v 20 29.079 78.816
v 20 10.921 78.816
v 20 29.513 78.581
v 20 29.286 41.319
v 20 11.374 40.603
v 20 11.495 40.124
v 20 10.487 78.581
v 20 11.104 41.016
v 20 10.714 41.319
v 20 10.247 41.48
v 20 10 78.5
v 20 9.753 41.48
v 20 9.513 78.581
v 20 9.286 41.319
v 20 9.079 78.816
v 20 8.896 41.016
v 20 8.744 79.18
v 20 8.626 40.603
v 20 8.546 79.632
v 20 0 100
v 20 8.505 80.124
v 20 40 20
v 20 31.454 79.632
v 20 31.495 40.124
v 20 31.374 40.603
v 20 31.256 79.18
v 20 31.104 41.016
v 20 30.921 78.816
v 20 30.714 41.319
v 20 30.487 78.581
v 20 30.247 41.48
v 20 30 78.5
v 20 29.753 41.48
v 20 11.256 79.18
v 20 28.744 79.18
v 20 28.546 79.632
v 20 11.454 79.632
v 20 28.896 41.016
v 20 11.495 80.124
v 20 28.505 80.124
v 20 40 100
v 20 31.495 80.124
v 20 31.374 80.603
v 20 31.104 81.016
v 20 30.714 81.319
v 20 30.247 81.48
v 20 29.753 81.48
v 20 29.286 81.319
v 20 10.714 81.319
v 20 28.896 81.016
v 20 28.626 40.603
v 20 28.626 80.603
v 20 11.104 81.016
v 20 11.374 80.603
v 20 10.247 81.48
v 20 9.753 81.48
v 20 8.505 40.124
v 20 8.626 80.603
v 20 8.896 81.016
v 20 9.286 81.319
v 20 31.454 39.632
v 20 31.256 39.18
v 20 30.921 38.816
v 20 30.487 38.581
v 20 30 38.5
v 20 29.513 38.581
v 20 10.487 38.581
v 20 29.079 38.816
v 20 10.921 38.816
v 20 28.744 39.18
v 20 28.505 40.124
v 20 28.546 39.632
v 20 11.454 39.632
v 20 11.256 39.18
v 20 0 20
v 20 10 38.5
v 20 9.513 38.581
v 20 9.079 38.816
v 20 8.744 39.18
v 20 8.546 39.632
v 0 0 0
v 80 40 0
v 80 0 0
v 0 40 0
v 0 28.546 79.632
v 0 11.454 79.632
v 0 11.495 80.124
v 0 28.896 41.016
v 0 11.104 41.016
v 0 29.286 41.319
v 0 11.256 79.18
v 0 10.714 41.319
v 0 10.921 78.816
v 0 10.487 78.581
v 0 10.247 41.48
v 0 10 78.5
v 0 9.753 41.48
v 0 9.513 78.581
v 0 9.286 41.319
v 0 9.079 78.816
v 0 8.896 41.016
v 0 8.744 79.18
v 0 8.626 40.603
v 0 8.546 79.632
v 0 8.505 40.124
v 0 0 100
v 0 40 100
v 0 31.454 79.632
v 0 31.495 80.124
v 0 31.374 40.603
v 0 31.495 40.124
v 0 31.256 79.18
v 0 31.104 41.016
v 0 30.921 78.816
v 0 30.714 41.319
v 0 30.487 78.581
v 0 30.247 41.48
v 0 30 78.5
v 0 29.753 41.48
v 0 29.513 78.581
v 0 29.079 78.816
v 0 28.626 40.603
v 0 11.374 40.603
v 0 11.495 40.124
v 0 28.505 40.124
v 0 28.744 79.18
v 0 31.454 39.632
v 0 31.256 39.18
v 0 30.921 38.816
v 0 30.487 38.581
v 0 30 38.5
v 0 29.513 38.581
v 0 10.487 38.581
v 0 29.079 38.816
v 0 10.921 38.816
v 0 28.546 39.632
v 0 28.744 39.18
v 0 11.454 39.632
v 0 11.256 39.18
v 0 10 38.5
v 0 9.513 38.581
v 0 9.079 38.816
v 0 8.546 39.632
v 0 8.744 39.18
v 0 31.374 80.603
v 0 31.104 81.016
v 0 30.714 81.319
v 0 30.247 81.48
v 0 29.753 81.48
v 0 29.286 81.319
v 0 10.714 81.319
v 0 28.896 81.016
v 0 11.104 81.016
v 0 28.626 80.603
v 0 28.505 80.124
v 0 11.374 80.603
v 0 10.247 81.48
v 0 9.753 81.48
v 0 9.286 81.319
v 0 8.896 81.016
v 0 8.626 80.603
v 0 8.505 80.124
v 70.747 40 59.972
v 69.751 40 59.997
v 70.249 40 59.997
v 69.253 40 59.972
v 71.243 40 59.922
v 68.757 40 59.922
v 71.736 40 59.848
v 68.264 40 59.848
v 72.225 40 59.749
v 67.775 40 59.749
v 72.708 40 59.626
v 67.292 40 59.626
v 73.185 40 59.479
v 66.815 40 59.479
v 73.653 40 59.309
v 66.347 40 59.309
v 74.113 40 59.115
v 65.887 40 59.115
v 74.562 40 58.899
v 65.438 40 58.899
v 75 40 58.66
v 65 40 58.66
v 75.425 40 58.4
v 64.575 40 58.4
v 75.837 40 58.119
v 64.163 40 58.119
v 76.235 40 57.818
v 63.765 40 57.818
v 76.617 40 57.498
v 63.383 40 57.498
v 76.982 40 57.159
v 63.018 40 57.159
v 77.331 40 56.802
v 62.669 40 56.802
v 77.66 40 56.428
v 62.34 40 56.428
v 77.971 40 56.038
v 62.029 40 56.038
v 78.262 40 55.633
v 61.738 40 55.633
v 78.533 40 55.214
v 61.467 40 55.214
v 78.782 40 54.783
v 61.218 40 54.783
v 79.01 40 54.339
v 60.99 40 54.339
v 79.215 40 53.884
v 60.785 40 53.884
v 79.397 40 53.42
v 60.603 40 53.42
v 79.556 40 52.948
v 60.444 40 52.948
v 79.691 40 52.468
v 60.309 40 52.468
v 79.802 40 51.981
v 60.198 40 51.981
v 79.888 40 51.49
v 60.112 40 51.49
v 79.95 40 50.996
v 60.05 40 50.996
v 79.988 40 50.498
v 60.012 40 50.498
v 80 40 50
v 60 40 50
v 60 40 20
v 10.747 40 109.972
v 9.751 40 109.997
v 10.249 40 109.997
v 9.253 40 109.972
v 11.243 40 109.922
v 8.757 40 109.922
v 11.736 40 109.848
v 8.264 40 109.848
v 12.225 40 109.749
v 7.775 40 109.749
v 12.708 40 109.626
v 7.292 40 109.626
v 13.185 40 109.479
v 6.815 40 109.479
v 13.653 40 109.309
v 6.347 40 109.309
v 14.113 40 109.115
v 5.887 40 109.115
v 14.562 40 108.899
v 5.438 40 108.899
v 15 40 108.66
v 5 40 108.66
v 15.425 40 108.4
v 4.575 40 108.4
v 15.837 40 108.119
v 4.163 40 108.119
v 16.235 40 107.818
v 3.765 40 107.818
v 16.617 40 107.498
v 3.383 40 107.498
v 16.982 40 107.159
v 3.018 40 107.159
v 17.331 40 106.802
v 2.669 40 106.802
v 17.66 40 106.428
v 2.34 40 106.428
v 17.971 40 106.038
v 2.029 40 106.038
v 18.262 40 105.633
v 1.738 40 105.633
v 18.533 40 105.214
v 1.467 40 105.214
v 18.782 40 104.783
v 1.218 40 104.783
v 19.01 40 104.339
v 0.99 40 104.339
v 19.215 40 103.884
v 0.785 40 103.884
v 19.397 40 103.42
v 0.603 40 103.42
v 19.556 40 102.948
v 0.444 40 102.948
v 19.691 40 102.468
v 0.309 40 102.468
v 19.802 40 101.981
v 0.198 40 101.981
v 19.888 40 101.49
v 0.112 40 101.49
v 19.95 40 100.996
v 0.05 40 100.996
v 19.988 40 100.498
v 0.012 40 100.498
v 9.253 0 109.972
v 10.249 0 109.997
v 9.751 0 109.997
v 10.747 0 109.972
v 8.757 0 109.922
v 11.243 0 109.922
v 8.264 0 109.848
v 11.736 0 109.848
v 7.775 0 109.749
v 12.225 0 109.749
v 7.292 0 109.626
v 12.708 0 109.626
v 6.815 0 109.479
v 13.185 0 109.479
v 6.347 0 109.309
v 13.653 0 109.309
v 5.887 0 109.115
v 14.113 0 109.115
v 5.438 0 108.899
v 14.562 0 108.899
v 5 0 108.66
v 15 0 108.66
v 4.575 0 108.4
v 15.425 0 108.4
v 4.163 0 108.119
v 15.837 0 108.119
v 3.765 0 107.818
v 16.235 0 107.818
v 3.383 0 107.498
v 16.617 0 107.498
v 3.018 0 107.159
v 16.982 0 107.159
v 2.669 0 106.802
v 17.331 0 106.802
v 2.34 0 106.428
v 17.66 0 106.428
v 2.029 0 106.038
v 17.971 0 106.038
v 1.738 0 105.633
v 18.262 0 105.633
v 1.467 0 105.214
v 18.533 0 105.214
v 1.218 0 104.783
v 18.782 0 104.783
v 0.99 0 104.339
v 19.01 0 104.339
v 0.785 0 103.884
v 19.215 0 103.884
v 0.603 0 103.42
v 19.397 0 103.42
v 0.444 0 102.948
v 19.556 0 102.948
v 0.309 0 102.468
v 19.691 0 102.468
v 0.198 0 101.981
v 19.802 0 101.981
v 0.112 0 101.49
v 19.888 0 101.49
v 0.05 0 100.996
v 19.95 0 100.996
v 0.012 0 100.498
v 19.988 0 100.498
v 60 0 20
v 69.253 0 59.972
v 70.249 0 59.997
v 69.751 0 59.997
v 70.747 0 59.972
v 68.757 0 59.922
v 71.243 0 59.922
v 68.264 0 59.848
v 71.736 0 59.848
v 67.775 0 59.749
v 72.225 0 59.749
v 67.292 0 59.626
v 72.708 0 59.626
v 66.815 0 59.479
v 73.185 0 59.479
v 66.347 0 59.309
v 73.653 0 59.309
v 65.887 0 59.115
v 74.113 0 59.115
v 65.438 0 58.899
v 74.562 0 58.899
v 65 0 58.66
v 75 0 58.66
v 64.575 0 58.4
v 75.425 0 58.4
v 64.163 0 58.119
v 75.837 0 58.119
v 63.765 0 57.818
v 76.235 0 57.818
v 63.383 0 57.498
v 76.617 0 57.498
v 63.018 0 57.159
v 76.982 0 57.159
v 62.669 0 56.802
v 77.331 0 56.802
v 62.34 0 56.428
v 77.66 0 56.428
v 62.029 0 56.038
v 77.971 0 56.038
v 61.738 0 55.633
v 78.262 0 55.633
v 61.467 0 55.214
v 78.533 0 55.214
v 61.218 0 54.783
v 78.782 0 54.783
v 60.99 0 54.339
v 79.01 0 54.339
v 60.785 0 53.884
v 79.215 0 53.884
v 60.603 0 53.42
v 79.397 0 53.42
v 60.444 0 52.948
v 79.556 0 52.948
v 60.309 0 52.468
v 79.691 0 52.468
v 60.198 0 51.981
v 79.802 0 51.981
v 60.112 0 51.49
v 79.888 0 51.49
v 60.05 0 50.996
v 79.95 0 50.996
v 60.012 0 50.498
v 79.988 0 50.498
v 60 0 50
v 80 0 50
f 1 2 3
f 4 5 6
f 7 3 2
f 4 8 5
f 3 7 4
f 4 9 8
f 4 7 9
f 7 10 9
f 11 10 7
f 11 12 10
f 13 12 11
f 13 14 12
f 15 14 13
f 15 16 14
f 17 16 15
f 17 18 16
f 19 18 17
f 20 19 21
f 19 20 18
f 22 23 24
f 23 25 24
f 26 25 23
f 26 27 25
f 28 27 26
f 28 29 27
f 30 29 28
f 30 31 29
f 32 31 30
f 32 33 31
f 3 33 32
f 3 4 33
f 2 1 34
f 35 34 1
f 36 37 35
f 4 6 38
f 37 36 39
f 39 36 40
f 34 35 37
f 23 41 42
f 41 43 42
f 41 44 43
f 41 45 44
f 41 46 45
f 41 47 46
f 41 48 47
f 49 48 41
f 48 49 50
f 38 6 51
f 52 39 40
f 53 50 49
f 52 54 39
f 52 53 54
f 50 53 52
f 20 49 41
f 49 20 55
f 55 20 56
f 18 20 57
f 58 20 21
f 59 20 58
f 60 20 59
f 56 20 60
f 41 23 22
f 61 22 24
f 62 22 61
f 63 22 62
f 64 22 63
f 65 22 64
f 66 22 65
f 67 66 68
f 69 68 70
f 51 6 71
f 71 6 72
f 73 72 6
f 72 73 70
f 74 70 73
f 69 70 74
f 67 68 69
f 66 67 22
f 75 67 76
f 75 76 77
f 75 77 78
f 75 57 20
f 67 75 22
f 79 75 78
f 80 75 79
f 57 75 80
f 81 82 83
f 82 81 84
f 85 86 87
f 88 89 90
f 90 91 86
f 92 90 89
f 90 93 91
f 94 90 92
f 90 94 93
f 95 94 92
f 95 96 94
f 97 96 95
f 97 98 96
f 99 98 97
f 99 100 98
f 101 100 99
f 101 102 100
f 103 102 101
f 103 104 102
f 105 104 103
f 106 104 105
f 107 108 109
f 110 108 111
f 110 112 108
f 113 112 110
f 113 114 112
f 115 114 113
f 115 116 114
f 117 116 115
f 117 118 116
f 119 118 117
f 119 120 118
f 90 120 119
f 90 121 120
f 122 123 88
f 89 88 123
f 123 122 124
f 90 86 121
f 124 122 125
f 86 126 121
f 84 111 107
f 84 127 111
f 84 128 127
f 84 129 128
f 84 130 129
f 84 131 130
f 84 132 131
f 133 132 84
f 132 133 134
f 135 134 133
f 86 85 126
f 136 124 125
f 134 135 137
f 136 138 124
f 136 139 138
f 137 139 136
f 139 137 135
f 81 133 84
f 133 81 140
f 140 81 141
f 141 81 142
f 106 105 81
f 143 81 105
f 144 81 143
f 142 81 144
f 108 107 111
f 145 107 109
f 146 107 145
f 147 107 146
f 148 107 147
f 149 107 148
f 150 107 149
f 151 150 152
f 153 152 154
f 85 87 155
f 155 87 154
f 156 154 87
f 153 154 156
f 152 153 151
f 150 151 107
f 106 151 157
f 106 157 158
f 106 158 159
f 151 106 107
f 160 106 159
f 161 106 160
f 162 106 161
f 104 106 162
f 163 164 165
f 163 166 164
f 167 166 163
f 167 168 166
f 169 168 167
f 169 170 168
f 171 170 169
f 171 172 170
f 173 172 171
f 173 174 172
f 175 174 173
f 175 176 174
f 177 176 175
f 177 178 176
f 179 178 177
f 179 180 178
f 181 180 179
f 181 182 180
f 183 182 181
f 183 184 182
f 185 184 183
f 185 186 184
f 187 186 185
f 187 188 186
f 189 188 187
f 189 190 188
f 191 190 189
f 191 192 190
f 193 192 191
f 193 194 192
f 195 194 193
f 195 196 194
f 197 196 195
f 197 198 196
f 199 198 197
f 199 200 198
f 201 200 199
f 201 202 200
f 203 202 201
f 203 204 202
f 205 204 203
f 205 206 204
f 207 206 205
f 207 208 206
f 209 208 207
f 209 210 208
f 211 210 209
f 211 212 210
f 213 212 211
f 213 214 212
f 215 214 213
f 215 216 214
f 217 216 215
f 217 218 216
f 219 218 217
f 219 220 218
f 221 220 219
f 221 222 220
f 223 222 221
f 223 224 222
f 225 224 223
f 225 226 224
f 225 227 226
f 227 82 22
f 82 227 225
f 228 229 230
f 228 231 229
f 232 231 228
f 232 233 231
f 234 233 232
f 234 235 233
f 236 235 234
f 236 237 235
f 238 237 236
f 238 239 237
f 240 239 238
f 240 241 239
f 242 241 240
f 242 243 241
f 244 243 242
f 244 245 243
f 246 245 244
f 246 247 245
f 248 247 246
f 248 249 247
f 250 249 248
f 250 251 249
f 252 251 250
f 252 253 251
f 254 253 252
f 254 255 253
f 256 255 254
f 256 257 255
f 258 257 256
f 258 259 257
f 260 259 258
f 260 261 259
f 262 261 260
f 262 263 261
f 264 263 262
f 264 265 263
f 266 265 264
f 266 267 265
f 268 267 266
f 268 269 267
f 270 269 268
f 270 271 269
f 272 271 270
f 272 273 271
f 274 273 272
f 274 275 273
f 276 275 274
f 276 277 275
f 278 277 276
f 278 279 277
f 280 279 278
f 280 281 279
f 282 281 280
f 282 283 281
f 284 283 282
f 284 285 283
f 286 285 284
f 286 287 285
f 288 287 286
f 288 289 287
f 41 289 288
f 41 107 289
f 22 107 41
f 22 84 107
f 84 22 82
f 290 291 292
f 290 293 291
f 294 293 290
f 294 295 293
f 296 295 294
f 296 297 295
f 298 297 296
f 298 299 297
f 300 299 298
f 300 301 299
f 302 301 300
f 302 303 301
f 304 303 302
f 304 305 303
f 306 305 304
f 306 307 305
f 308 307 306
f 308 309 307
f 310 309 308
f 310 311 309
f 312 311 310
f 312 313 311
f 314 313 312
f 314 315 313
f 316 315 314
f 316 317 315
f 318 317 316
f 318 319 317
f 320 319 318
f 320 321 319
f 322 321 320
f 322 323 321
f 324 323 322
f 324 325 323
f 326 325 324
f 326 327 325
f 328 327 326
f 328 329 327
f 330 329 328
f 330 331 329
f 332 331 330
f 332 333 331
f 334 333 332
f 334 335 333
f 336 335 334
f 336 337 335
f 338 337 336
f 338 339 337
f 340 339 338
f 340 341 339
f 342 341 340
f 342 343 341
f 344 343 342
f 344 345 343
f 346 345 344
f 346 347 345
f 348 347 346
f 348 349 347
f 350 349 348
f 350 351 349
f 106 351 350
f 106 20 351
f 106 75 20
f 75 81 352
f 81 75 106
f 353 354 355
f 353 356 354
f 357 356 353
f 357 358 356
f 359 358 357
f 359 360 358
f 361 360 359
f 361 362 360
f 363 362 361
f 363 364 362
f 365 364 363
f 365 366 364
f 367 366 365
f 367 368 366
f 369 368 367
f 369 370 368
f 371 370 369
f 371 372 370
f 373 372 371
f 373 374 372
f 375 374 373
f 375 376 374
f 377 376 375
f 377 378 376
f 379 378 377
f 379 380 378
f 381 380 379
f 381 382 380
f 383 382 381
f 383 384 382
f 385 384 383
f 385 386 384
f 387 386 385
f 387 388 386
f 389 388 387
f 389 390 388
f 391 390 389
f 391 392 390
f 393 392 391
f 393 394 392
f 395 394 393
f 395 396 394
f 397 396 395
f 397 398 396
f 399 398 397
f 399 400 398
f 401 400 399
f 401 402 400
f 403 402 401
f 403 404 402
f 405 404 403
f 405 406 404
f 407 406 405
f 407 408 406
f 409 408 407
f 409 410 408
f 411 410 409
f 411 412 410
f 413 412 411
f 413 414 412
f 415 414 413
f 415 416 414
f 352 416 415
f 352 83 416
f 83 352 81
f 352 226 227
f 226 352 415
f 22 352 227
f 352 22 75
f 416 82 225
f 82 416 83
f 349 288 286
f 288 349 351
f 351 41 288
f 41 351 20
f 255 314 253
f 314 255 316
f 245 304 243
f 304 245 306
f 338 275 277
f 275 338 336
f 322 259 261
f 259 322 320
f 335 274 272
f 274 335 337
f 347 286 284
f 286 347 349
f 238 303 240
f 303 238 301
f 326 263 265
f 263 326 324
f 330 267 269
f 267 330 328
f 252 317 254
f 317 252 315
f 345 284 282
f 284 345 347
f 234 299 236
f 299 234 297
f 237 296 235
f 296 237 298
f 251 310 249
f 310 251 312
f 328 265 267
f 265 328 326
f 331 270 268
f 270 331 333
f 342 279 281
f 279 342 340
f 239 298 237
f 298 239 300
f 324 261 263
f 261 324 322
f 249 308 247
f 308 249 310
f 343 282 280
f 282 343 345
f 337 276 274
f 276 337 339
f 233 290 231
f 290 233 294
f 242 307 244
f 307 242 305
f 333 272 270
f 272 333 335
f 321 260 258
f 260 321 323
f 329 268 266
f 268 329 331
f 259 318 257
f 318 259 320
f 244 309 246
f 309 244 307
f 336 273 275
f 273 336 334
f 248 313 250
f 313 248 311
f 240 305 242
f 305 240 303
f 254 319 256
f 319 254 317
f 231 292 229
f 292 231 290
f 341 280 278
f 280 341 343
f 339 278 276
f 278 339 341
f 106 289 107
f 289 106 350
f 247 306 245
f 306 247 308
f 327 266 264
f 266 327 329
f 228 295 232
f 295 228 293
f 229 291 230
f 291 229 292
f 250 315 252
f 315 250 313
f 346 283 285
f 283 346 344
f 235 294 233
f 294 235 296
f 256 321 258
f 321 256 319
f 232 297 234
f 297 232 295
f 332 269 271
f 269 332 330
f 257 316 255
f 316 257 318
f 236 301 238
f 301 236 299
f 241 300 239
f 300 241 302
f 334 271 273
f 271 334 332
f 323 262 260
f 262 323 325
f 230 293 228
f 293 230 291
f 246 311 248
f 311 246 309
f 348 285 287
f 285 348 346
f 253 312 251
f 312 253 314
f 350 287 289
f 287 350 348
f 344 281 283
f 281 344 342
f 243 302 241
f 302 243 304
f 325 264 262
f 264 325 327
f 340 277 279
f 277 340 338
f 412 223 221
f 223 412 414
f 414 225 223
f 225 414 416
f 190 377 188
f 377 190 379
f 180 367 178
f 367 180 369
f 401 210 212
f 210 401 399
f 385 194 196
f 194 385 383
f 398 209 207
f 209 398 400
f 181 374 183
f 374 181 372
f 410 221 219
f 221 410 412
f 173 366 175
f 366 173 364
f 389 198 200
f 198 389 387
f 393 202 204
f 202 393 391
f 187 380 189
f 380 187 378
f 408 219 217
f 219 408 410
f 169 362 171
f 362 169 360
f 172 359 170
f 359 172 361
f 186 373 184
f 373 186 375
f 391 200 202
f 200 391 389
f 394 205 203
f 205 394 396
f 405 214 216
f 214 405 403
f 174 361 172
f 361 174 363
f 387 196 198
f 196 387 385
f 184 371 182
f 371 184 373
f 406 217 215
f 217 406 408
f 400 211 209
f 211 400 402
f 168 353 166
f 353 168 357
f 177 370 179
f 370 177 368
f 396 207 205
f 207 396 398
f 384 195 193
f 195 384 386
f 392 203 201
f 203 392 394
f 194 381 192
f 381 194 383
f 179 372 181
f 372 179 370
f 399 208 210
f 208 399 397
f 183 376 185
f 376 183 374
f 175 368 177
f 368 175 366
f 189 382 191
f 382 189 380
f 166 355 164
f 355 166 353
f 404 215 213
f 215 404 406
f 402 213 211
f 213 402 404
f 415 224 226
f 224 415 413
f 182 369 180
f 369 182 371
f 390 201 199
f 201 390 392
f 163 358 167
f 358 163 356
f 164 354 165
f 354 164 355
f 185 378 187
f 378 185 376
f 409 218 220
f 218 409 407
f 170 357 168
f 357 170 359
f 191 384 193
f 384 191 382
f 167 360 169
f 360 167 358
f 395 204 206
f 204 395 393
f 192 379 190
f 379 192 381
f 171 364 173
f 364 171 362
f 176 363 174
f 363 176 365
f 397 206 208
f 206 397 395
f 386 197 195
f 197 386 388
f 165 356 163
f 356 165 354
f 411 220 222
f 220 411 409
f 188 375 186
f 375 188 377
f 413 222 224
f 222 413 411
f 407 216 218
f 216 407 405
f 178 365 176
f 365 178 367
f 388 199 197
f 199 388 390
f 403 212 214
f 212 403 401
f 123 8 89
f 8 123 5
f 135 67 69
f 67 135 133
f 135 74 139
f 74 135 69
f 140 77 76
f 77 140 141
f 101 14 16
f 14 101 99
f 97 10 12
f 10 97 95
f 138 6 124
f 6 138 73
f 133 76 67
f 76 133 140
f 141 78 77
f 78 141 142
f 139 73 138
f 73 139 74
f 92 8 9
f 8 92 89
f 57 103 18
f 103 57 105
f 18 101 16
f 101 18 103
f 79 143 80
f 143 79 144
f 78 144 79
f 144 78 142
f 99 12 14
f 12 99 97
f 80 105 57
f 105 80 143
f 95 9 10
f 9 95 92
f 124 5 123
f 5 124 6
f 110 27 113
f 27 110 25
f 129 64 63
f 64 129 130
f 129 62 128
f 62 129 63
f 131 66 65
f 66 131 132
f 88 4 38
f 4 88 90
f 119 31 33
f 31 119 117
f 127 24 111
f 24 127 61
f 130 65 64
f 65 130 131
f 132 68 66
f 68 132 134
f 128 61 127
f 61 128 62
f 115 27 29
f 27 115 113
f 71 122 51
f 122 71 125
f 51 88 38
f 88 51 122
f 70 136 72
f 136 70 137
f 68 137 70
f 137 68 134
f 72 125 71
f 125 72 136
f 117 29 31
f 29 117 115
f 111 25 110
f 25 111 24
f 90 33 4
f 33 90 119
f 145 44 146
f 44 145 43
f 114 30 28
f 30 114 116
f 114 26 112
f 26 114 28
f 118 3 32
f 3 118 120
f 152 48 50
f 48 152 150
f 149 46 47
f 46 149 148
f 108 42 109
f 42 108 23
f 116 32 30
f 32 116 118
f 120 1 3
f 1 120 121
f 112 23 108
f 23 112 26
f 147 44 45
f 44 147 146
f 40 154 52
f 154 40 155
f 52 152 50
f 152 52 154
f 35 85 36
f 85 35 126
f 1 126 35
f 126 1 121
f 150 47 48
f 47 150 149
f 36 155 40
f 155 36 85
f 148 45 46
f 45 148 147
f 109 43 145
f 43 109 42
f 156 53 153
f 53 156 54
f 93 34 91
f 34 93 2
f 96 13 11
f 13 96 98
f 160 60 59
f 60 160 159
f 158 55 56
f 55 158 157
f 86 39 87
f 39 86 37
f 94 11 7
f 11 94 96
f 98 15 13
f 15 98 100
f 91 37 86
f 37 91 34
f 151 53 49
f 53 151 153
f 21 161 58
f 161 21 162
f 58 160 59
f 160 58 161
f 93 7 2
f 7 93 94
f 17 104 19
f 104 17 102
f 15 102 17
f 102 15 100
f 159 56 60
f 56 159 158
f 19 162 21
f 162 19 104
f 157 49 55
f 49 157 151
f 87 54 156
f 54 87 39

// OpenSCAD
$fs=.5;
$fa=.5;
width = 40;
hole_size = 3;
back_height=100;
front_height=50;
thickness=20;
bottom_hole_height=40;
top_hole_height=80;
front_length=60;
difference()
{
	union()
	{
	cube([thickness,width,back_height]);
	cube([front_length,width,thickness]);
	translate([front_length,0,0])cube([thickness,width,front_height]);
	rotate([90,0,0])translate([thickness/2,back_height,-width/2])cylinder(h=width, r=thickness/2, center=true);
	rotate([90,0,0])translate([front_length+thickness/2,front_height,-width/2])cylinder(h=width, r=thickness/2,center=true);
}
rotate([0,90,0])translate([-bottom_hole_height,10,-1])cylinder(d=hole_size, h=thickness+2);
rotate([0,90,0])translate([-bottom_hole_height,width-10,-1])cylinder(d=hole_size, h=thickness+2);
rotate([0,90,0])translate([-top_hole_height,width-10,-1])cylinder(d=hole_size, h=thickness+2);
rotate([0,90,0])translate([-top_hole_height,10,-1])cylinder(d=hole_size, h=thickness+2);
}
